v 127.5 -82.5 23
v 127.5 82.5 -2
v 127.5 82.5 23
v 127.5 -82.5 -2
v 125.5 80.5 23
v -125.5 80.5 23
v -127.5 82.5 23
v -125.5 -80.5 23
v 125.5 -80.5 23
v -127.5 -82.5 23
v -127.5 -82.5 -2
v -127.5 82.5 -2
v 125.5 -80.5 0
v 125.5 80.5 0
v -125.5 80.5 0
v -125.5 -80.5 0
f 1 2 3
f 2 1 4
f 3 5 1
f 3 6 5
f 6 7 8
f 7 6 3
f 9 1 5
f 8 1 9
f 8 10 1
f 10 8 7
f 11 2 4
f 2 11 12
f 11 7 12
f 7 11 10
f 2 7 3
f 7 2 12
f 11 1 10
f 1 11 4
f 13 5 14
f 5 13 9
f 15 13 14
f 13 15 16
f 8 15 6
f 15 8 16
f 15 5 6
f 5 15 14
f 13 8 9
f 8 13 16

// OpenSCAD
/* [Enclosure] */
// - x,y,z,length,width,height,thickness,fillet,xcentres,ycentres,label
cn=[0,0,0,255,165,25,2,3,240,155,"CN"];

module enclosure(x=0,y=0,z=0,l=100,w=50,h=25,t=2,r=3,xc=95,yc=45,label="Label"){
    translate([x,y,h/2-t]){ //move to position
        difference(){   //hollow out inner
            cube([l,w,h],center=true); //outer
            translate([0,0,t]){    //move inner up by thickness
                cube([l-2*t,w-2*t,h],center=true);   //inner
            }
        }
        //print id label
        text(label,size=5,halign="center");
    }
}
enclosure(cn[0],cn[1],cn[2],cn[3],cn[4],cn[5],cn[6],cn[7],cn[8],cn[9],cn[10]);

//enclosure(cn);
